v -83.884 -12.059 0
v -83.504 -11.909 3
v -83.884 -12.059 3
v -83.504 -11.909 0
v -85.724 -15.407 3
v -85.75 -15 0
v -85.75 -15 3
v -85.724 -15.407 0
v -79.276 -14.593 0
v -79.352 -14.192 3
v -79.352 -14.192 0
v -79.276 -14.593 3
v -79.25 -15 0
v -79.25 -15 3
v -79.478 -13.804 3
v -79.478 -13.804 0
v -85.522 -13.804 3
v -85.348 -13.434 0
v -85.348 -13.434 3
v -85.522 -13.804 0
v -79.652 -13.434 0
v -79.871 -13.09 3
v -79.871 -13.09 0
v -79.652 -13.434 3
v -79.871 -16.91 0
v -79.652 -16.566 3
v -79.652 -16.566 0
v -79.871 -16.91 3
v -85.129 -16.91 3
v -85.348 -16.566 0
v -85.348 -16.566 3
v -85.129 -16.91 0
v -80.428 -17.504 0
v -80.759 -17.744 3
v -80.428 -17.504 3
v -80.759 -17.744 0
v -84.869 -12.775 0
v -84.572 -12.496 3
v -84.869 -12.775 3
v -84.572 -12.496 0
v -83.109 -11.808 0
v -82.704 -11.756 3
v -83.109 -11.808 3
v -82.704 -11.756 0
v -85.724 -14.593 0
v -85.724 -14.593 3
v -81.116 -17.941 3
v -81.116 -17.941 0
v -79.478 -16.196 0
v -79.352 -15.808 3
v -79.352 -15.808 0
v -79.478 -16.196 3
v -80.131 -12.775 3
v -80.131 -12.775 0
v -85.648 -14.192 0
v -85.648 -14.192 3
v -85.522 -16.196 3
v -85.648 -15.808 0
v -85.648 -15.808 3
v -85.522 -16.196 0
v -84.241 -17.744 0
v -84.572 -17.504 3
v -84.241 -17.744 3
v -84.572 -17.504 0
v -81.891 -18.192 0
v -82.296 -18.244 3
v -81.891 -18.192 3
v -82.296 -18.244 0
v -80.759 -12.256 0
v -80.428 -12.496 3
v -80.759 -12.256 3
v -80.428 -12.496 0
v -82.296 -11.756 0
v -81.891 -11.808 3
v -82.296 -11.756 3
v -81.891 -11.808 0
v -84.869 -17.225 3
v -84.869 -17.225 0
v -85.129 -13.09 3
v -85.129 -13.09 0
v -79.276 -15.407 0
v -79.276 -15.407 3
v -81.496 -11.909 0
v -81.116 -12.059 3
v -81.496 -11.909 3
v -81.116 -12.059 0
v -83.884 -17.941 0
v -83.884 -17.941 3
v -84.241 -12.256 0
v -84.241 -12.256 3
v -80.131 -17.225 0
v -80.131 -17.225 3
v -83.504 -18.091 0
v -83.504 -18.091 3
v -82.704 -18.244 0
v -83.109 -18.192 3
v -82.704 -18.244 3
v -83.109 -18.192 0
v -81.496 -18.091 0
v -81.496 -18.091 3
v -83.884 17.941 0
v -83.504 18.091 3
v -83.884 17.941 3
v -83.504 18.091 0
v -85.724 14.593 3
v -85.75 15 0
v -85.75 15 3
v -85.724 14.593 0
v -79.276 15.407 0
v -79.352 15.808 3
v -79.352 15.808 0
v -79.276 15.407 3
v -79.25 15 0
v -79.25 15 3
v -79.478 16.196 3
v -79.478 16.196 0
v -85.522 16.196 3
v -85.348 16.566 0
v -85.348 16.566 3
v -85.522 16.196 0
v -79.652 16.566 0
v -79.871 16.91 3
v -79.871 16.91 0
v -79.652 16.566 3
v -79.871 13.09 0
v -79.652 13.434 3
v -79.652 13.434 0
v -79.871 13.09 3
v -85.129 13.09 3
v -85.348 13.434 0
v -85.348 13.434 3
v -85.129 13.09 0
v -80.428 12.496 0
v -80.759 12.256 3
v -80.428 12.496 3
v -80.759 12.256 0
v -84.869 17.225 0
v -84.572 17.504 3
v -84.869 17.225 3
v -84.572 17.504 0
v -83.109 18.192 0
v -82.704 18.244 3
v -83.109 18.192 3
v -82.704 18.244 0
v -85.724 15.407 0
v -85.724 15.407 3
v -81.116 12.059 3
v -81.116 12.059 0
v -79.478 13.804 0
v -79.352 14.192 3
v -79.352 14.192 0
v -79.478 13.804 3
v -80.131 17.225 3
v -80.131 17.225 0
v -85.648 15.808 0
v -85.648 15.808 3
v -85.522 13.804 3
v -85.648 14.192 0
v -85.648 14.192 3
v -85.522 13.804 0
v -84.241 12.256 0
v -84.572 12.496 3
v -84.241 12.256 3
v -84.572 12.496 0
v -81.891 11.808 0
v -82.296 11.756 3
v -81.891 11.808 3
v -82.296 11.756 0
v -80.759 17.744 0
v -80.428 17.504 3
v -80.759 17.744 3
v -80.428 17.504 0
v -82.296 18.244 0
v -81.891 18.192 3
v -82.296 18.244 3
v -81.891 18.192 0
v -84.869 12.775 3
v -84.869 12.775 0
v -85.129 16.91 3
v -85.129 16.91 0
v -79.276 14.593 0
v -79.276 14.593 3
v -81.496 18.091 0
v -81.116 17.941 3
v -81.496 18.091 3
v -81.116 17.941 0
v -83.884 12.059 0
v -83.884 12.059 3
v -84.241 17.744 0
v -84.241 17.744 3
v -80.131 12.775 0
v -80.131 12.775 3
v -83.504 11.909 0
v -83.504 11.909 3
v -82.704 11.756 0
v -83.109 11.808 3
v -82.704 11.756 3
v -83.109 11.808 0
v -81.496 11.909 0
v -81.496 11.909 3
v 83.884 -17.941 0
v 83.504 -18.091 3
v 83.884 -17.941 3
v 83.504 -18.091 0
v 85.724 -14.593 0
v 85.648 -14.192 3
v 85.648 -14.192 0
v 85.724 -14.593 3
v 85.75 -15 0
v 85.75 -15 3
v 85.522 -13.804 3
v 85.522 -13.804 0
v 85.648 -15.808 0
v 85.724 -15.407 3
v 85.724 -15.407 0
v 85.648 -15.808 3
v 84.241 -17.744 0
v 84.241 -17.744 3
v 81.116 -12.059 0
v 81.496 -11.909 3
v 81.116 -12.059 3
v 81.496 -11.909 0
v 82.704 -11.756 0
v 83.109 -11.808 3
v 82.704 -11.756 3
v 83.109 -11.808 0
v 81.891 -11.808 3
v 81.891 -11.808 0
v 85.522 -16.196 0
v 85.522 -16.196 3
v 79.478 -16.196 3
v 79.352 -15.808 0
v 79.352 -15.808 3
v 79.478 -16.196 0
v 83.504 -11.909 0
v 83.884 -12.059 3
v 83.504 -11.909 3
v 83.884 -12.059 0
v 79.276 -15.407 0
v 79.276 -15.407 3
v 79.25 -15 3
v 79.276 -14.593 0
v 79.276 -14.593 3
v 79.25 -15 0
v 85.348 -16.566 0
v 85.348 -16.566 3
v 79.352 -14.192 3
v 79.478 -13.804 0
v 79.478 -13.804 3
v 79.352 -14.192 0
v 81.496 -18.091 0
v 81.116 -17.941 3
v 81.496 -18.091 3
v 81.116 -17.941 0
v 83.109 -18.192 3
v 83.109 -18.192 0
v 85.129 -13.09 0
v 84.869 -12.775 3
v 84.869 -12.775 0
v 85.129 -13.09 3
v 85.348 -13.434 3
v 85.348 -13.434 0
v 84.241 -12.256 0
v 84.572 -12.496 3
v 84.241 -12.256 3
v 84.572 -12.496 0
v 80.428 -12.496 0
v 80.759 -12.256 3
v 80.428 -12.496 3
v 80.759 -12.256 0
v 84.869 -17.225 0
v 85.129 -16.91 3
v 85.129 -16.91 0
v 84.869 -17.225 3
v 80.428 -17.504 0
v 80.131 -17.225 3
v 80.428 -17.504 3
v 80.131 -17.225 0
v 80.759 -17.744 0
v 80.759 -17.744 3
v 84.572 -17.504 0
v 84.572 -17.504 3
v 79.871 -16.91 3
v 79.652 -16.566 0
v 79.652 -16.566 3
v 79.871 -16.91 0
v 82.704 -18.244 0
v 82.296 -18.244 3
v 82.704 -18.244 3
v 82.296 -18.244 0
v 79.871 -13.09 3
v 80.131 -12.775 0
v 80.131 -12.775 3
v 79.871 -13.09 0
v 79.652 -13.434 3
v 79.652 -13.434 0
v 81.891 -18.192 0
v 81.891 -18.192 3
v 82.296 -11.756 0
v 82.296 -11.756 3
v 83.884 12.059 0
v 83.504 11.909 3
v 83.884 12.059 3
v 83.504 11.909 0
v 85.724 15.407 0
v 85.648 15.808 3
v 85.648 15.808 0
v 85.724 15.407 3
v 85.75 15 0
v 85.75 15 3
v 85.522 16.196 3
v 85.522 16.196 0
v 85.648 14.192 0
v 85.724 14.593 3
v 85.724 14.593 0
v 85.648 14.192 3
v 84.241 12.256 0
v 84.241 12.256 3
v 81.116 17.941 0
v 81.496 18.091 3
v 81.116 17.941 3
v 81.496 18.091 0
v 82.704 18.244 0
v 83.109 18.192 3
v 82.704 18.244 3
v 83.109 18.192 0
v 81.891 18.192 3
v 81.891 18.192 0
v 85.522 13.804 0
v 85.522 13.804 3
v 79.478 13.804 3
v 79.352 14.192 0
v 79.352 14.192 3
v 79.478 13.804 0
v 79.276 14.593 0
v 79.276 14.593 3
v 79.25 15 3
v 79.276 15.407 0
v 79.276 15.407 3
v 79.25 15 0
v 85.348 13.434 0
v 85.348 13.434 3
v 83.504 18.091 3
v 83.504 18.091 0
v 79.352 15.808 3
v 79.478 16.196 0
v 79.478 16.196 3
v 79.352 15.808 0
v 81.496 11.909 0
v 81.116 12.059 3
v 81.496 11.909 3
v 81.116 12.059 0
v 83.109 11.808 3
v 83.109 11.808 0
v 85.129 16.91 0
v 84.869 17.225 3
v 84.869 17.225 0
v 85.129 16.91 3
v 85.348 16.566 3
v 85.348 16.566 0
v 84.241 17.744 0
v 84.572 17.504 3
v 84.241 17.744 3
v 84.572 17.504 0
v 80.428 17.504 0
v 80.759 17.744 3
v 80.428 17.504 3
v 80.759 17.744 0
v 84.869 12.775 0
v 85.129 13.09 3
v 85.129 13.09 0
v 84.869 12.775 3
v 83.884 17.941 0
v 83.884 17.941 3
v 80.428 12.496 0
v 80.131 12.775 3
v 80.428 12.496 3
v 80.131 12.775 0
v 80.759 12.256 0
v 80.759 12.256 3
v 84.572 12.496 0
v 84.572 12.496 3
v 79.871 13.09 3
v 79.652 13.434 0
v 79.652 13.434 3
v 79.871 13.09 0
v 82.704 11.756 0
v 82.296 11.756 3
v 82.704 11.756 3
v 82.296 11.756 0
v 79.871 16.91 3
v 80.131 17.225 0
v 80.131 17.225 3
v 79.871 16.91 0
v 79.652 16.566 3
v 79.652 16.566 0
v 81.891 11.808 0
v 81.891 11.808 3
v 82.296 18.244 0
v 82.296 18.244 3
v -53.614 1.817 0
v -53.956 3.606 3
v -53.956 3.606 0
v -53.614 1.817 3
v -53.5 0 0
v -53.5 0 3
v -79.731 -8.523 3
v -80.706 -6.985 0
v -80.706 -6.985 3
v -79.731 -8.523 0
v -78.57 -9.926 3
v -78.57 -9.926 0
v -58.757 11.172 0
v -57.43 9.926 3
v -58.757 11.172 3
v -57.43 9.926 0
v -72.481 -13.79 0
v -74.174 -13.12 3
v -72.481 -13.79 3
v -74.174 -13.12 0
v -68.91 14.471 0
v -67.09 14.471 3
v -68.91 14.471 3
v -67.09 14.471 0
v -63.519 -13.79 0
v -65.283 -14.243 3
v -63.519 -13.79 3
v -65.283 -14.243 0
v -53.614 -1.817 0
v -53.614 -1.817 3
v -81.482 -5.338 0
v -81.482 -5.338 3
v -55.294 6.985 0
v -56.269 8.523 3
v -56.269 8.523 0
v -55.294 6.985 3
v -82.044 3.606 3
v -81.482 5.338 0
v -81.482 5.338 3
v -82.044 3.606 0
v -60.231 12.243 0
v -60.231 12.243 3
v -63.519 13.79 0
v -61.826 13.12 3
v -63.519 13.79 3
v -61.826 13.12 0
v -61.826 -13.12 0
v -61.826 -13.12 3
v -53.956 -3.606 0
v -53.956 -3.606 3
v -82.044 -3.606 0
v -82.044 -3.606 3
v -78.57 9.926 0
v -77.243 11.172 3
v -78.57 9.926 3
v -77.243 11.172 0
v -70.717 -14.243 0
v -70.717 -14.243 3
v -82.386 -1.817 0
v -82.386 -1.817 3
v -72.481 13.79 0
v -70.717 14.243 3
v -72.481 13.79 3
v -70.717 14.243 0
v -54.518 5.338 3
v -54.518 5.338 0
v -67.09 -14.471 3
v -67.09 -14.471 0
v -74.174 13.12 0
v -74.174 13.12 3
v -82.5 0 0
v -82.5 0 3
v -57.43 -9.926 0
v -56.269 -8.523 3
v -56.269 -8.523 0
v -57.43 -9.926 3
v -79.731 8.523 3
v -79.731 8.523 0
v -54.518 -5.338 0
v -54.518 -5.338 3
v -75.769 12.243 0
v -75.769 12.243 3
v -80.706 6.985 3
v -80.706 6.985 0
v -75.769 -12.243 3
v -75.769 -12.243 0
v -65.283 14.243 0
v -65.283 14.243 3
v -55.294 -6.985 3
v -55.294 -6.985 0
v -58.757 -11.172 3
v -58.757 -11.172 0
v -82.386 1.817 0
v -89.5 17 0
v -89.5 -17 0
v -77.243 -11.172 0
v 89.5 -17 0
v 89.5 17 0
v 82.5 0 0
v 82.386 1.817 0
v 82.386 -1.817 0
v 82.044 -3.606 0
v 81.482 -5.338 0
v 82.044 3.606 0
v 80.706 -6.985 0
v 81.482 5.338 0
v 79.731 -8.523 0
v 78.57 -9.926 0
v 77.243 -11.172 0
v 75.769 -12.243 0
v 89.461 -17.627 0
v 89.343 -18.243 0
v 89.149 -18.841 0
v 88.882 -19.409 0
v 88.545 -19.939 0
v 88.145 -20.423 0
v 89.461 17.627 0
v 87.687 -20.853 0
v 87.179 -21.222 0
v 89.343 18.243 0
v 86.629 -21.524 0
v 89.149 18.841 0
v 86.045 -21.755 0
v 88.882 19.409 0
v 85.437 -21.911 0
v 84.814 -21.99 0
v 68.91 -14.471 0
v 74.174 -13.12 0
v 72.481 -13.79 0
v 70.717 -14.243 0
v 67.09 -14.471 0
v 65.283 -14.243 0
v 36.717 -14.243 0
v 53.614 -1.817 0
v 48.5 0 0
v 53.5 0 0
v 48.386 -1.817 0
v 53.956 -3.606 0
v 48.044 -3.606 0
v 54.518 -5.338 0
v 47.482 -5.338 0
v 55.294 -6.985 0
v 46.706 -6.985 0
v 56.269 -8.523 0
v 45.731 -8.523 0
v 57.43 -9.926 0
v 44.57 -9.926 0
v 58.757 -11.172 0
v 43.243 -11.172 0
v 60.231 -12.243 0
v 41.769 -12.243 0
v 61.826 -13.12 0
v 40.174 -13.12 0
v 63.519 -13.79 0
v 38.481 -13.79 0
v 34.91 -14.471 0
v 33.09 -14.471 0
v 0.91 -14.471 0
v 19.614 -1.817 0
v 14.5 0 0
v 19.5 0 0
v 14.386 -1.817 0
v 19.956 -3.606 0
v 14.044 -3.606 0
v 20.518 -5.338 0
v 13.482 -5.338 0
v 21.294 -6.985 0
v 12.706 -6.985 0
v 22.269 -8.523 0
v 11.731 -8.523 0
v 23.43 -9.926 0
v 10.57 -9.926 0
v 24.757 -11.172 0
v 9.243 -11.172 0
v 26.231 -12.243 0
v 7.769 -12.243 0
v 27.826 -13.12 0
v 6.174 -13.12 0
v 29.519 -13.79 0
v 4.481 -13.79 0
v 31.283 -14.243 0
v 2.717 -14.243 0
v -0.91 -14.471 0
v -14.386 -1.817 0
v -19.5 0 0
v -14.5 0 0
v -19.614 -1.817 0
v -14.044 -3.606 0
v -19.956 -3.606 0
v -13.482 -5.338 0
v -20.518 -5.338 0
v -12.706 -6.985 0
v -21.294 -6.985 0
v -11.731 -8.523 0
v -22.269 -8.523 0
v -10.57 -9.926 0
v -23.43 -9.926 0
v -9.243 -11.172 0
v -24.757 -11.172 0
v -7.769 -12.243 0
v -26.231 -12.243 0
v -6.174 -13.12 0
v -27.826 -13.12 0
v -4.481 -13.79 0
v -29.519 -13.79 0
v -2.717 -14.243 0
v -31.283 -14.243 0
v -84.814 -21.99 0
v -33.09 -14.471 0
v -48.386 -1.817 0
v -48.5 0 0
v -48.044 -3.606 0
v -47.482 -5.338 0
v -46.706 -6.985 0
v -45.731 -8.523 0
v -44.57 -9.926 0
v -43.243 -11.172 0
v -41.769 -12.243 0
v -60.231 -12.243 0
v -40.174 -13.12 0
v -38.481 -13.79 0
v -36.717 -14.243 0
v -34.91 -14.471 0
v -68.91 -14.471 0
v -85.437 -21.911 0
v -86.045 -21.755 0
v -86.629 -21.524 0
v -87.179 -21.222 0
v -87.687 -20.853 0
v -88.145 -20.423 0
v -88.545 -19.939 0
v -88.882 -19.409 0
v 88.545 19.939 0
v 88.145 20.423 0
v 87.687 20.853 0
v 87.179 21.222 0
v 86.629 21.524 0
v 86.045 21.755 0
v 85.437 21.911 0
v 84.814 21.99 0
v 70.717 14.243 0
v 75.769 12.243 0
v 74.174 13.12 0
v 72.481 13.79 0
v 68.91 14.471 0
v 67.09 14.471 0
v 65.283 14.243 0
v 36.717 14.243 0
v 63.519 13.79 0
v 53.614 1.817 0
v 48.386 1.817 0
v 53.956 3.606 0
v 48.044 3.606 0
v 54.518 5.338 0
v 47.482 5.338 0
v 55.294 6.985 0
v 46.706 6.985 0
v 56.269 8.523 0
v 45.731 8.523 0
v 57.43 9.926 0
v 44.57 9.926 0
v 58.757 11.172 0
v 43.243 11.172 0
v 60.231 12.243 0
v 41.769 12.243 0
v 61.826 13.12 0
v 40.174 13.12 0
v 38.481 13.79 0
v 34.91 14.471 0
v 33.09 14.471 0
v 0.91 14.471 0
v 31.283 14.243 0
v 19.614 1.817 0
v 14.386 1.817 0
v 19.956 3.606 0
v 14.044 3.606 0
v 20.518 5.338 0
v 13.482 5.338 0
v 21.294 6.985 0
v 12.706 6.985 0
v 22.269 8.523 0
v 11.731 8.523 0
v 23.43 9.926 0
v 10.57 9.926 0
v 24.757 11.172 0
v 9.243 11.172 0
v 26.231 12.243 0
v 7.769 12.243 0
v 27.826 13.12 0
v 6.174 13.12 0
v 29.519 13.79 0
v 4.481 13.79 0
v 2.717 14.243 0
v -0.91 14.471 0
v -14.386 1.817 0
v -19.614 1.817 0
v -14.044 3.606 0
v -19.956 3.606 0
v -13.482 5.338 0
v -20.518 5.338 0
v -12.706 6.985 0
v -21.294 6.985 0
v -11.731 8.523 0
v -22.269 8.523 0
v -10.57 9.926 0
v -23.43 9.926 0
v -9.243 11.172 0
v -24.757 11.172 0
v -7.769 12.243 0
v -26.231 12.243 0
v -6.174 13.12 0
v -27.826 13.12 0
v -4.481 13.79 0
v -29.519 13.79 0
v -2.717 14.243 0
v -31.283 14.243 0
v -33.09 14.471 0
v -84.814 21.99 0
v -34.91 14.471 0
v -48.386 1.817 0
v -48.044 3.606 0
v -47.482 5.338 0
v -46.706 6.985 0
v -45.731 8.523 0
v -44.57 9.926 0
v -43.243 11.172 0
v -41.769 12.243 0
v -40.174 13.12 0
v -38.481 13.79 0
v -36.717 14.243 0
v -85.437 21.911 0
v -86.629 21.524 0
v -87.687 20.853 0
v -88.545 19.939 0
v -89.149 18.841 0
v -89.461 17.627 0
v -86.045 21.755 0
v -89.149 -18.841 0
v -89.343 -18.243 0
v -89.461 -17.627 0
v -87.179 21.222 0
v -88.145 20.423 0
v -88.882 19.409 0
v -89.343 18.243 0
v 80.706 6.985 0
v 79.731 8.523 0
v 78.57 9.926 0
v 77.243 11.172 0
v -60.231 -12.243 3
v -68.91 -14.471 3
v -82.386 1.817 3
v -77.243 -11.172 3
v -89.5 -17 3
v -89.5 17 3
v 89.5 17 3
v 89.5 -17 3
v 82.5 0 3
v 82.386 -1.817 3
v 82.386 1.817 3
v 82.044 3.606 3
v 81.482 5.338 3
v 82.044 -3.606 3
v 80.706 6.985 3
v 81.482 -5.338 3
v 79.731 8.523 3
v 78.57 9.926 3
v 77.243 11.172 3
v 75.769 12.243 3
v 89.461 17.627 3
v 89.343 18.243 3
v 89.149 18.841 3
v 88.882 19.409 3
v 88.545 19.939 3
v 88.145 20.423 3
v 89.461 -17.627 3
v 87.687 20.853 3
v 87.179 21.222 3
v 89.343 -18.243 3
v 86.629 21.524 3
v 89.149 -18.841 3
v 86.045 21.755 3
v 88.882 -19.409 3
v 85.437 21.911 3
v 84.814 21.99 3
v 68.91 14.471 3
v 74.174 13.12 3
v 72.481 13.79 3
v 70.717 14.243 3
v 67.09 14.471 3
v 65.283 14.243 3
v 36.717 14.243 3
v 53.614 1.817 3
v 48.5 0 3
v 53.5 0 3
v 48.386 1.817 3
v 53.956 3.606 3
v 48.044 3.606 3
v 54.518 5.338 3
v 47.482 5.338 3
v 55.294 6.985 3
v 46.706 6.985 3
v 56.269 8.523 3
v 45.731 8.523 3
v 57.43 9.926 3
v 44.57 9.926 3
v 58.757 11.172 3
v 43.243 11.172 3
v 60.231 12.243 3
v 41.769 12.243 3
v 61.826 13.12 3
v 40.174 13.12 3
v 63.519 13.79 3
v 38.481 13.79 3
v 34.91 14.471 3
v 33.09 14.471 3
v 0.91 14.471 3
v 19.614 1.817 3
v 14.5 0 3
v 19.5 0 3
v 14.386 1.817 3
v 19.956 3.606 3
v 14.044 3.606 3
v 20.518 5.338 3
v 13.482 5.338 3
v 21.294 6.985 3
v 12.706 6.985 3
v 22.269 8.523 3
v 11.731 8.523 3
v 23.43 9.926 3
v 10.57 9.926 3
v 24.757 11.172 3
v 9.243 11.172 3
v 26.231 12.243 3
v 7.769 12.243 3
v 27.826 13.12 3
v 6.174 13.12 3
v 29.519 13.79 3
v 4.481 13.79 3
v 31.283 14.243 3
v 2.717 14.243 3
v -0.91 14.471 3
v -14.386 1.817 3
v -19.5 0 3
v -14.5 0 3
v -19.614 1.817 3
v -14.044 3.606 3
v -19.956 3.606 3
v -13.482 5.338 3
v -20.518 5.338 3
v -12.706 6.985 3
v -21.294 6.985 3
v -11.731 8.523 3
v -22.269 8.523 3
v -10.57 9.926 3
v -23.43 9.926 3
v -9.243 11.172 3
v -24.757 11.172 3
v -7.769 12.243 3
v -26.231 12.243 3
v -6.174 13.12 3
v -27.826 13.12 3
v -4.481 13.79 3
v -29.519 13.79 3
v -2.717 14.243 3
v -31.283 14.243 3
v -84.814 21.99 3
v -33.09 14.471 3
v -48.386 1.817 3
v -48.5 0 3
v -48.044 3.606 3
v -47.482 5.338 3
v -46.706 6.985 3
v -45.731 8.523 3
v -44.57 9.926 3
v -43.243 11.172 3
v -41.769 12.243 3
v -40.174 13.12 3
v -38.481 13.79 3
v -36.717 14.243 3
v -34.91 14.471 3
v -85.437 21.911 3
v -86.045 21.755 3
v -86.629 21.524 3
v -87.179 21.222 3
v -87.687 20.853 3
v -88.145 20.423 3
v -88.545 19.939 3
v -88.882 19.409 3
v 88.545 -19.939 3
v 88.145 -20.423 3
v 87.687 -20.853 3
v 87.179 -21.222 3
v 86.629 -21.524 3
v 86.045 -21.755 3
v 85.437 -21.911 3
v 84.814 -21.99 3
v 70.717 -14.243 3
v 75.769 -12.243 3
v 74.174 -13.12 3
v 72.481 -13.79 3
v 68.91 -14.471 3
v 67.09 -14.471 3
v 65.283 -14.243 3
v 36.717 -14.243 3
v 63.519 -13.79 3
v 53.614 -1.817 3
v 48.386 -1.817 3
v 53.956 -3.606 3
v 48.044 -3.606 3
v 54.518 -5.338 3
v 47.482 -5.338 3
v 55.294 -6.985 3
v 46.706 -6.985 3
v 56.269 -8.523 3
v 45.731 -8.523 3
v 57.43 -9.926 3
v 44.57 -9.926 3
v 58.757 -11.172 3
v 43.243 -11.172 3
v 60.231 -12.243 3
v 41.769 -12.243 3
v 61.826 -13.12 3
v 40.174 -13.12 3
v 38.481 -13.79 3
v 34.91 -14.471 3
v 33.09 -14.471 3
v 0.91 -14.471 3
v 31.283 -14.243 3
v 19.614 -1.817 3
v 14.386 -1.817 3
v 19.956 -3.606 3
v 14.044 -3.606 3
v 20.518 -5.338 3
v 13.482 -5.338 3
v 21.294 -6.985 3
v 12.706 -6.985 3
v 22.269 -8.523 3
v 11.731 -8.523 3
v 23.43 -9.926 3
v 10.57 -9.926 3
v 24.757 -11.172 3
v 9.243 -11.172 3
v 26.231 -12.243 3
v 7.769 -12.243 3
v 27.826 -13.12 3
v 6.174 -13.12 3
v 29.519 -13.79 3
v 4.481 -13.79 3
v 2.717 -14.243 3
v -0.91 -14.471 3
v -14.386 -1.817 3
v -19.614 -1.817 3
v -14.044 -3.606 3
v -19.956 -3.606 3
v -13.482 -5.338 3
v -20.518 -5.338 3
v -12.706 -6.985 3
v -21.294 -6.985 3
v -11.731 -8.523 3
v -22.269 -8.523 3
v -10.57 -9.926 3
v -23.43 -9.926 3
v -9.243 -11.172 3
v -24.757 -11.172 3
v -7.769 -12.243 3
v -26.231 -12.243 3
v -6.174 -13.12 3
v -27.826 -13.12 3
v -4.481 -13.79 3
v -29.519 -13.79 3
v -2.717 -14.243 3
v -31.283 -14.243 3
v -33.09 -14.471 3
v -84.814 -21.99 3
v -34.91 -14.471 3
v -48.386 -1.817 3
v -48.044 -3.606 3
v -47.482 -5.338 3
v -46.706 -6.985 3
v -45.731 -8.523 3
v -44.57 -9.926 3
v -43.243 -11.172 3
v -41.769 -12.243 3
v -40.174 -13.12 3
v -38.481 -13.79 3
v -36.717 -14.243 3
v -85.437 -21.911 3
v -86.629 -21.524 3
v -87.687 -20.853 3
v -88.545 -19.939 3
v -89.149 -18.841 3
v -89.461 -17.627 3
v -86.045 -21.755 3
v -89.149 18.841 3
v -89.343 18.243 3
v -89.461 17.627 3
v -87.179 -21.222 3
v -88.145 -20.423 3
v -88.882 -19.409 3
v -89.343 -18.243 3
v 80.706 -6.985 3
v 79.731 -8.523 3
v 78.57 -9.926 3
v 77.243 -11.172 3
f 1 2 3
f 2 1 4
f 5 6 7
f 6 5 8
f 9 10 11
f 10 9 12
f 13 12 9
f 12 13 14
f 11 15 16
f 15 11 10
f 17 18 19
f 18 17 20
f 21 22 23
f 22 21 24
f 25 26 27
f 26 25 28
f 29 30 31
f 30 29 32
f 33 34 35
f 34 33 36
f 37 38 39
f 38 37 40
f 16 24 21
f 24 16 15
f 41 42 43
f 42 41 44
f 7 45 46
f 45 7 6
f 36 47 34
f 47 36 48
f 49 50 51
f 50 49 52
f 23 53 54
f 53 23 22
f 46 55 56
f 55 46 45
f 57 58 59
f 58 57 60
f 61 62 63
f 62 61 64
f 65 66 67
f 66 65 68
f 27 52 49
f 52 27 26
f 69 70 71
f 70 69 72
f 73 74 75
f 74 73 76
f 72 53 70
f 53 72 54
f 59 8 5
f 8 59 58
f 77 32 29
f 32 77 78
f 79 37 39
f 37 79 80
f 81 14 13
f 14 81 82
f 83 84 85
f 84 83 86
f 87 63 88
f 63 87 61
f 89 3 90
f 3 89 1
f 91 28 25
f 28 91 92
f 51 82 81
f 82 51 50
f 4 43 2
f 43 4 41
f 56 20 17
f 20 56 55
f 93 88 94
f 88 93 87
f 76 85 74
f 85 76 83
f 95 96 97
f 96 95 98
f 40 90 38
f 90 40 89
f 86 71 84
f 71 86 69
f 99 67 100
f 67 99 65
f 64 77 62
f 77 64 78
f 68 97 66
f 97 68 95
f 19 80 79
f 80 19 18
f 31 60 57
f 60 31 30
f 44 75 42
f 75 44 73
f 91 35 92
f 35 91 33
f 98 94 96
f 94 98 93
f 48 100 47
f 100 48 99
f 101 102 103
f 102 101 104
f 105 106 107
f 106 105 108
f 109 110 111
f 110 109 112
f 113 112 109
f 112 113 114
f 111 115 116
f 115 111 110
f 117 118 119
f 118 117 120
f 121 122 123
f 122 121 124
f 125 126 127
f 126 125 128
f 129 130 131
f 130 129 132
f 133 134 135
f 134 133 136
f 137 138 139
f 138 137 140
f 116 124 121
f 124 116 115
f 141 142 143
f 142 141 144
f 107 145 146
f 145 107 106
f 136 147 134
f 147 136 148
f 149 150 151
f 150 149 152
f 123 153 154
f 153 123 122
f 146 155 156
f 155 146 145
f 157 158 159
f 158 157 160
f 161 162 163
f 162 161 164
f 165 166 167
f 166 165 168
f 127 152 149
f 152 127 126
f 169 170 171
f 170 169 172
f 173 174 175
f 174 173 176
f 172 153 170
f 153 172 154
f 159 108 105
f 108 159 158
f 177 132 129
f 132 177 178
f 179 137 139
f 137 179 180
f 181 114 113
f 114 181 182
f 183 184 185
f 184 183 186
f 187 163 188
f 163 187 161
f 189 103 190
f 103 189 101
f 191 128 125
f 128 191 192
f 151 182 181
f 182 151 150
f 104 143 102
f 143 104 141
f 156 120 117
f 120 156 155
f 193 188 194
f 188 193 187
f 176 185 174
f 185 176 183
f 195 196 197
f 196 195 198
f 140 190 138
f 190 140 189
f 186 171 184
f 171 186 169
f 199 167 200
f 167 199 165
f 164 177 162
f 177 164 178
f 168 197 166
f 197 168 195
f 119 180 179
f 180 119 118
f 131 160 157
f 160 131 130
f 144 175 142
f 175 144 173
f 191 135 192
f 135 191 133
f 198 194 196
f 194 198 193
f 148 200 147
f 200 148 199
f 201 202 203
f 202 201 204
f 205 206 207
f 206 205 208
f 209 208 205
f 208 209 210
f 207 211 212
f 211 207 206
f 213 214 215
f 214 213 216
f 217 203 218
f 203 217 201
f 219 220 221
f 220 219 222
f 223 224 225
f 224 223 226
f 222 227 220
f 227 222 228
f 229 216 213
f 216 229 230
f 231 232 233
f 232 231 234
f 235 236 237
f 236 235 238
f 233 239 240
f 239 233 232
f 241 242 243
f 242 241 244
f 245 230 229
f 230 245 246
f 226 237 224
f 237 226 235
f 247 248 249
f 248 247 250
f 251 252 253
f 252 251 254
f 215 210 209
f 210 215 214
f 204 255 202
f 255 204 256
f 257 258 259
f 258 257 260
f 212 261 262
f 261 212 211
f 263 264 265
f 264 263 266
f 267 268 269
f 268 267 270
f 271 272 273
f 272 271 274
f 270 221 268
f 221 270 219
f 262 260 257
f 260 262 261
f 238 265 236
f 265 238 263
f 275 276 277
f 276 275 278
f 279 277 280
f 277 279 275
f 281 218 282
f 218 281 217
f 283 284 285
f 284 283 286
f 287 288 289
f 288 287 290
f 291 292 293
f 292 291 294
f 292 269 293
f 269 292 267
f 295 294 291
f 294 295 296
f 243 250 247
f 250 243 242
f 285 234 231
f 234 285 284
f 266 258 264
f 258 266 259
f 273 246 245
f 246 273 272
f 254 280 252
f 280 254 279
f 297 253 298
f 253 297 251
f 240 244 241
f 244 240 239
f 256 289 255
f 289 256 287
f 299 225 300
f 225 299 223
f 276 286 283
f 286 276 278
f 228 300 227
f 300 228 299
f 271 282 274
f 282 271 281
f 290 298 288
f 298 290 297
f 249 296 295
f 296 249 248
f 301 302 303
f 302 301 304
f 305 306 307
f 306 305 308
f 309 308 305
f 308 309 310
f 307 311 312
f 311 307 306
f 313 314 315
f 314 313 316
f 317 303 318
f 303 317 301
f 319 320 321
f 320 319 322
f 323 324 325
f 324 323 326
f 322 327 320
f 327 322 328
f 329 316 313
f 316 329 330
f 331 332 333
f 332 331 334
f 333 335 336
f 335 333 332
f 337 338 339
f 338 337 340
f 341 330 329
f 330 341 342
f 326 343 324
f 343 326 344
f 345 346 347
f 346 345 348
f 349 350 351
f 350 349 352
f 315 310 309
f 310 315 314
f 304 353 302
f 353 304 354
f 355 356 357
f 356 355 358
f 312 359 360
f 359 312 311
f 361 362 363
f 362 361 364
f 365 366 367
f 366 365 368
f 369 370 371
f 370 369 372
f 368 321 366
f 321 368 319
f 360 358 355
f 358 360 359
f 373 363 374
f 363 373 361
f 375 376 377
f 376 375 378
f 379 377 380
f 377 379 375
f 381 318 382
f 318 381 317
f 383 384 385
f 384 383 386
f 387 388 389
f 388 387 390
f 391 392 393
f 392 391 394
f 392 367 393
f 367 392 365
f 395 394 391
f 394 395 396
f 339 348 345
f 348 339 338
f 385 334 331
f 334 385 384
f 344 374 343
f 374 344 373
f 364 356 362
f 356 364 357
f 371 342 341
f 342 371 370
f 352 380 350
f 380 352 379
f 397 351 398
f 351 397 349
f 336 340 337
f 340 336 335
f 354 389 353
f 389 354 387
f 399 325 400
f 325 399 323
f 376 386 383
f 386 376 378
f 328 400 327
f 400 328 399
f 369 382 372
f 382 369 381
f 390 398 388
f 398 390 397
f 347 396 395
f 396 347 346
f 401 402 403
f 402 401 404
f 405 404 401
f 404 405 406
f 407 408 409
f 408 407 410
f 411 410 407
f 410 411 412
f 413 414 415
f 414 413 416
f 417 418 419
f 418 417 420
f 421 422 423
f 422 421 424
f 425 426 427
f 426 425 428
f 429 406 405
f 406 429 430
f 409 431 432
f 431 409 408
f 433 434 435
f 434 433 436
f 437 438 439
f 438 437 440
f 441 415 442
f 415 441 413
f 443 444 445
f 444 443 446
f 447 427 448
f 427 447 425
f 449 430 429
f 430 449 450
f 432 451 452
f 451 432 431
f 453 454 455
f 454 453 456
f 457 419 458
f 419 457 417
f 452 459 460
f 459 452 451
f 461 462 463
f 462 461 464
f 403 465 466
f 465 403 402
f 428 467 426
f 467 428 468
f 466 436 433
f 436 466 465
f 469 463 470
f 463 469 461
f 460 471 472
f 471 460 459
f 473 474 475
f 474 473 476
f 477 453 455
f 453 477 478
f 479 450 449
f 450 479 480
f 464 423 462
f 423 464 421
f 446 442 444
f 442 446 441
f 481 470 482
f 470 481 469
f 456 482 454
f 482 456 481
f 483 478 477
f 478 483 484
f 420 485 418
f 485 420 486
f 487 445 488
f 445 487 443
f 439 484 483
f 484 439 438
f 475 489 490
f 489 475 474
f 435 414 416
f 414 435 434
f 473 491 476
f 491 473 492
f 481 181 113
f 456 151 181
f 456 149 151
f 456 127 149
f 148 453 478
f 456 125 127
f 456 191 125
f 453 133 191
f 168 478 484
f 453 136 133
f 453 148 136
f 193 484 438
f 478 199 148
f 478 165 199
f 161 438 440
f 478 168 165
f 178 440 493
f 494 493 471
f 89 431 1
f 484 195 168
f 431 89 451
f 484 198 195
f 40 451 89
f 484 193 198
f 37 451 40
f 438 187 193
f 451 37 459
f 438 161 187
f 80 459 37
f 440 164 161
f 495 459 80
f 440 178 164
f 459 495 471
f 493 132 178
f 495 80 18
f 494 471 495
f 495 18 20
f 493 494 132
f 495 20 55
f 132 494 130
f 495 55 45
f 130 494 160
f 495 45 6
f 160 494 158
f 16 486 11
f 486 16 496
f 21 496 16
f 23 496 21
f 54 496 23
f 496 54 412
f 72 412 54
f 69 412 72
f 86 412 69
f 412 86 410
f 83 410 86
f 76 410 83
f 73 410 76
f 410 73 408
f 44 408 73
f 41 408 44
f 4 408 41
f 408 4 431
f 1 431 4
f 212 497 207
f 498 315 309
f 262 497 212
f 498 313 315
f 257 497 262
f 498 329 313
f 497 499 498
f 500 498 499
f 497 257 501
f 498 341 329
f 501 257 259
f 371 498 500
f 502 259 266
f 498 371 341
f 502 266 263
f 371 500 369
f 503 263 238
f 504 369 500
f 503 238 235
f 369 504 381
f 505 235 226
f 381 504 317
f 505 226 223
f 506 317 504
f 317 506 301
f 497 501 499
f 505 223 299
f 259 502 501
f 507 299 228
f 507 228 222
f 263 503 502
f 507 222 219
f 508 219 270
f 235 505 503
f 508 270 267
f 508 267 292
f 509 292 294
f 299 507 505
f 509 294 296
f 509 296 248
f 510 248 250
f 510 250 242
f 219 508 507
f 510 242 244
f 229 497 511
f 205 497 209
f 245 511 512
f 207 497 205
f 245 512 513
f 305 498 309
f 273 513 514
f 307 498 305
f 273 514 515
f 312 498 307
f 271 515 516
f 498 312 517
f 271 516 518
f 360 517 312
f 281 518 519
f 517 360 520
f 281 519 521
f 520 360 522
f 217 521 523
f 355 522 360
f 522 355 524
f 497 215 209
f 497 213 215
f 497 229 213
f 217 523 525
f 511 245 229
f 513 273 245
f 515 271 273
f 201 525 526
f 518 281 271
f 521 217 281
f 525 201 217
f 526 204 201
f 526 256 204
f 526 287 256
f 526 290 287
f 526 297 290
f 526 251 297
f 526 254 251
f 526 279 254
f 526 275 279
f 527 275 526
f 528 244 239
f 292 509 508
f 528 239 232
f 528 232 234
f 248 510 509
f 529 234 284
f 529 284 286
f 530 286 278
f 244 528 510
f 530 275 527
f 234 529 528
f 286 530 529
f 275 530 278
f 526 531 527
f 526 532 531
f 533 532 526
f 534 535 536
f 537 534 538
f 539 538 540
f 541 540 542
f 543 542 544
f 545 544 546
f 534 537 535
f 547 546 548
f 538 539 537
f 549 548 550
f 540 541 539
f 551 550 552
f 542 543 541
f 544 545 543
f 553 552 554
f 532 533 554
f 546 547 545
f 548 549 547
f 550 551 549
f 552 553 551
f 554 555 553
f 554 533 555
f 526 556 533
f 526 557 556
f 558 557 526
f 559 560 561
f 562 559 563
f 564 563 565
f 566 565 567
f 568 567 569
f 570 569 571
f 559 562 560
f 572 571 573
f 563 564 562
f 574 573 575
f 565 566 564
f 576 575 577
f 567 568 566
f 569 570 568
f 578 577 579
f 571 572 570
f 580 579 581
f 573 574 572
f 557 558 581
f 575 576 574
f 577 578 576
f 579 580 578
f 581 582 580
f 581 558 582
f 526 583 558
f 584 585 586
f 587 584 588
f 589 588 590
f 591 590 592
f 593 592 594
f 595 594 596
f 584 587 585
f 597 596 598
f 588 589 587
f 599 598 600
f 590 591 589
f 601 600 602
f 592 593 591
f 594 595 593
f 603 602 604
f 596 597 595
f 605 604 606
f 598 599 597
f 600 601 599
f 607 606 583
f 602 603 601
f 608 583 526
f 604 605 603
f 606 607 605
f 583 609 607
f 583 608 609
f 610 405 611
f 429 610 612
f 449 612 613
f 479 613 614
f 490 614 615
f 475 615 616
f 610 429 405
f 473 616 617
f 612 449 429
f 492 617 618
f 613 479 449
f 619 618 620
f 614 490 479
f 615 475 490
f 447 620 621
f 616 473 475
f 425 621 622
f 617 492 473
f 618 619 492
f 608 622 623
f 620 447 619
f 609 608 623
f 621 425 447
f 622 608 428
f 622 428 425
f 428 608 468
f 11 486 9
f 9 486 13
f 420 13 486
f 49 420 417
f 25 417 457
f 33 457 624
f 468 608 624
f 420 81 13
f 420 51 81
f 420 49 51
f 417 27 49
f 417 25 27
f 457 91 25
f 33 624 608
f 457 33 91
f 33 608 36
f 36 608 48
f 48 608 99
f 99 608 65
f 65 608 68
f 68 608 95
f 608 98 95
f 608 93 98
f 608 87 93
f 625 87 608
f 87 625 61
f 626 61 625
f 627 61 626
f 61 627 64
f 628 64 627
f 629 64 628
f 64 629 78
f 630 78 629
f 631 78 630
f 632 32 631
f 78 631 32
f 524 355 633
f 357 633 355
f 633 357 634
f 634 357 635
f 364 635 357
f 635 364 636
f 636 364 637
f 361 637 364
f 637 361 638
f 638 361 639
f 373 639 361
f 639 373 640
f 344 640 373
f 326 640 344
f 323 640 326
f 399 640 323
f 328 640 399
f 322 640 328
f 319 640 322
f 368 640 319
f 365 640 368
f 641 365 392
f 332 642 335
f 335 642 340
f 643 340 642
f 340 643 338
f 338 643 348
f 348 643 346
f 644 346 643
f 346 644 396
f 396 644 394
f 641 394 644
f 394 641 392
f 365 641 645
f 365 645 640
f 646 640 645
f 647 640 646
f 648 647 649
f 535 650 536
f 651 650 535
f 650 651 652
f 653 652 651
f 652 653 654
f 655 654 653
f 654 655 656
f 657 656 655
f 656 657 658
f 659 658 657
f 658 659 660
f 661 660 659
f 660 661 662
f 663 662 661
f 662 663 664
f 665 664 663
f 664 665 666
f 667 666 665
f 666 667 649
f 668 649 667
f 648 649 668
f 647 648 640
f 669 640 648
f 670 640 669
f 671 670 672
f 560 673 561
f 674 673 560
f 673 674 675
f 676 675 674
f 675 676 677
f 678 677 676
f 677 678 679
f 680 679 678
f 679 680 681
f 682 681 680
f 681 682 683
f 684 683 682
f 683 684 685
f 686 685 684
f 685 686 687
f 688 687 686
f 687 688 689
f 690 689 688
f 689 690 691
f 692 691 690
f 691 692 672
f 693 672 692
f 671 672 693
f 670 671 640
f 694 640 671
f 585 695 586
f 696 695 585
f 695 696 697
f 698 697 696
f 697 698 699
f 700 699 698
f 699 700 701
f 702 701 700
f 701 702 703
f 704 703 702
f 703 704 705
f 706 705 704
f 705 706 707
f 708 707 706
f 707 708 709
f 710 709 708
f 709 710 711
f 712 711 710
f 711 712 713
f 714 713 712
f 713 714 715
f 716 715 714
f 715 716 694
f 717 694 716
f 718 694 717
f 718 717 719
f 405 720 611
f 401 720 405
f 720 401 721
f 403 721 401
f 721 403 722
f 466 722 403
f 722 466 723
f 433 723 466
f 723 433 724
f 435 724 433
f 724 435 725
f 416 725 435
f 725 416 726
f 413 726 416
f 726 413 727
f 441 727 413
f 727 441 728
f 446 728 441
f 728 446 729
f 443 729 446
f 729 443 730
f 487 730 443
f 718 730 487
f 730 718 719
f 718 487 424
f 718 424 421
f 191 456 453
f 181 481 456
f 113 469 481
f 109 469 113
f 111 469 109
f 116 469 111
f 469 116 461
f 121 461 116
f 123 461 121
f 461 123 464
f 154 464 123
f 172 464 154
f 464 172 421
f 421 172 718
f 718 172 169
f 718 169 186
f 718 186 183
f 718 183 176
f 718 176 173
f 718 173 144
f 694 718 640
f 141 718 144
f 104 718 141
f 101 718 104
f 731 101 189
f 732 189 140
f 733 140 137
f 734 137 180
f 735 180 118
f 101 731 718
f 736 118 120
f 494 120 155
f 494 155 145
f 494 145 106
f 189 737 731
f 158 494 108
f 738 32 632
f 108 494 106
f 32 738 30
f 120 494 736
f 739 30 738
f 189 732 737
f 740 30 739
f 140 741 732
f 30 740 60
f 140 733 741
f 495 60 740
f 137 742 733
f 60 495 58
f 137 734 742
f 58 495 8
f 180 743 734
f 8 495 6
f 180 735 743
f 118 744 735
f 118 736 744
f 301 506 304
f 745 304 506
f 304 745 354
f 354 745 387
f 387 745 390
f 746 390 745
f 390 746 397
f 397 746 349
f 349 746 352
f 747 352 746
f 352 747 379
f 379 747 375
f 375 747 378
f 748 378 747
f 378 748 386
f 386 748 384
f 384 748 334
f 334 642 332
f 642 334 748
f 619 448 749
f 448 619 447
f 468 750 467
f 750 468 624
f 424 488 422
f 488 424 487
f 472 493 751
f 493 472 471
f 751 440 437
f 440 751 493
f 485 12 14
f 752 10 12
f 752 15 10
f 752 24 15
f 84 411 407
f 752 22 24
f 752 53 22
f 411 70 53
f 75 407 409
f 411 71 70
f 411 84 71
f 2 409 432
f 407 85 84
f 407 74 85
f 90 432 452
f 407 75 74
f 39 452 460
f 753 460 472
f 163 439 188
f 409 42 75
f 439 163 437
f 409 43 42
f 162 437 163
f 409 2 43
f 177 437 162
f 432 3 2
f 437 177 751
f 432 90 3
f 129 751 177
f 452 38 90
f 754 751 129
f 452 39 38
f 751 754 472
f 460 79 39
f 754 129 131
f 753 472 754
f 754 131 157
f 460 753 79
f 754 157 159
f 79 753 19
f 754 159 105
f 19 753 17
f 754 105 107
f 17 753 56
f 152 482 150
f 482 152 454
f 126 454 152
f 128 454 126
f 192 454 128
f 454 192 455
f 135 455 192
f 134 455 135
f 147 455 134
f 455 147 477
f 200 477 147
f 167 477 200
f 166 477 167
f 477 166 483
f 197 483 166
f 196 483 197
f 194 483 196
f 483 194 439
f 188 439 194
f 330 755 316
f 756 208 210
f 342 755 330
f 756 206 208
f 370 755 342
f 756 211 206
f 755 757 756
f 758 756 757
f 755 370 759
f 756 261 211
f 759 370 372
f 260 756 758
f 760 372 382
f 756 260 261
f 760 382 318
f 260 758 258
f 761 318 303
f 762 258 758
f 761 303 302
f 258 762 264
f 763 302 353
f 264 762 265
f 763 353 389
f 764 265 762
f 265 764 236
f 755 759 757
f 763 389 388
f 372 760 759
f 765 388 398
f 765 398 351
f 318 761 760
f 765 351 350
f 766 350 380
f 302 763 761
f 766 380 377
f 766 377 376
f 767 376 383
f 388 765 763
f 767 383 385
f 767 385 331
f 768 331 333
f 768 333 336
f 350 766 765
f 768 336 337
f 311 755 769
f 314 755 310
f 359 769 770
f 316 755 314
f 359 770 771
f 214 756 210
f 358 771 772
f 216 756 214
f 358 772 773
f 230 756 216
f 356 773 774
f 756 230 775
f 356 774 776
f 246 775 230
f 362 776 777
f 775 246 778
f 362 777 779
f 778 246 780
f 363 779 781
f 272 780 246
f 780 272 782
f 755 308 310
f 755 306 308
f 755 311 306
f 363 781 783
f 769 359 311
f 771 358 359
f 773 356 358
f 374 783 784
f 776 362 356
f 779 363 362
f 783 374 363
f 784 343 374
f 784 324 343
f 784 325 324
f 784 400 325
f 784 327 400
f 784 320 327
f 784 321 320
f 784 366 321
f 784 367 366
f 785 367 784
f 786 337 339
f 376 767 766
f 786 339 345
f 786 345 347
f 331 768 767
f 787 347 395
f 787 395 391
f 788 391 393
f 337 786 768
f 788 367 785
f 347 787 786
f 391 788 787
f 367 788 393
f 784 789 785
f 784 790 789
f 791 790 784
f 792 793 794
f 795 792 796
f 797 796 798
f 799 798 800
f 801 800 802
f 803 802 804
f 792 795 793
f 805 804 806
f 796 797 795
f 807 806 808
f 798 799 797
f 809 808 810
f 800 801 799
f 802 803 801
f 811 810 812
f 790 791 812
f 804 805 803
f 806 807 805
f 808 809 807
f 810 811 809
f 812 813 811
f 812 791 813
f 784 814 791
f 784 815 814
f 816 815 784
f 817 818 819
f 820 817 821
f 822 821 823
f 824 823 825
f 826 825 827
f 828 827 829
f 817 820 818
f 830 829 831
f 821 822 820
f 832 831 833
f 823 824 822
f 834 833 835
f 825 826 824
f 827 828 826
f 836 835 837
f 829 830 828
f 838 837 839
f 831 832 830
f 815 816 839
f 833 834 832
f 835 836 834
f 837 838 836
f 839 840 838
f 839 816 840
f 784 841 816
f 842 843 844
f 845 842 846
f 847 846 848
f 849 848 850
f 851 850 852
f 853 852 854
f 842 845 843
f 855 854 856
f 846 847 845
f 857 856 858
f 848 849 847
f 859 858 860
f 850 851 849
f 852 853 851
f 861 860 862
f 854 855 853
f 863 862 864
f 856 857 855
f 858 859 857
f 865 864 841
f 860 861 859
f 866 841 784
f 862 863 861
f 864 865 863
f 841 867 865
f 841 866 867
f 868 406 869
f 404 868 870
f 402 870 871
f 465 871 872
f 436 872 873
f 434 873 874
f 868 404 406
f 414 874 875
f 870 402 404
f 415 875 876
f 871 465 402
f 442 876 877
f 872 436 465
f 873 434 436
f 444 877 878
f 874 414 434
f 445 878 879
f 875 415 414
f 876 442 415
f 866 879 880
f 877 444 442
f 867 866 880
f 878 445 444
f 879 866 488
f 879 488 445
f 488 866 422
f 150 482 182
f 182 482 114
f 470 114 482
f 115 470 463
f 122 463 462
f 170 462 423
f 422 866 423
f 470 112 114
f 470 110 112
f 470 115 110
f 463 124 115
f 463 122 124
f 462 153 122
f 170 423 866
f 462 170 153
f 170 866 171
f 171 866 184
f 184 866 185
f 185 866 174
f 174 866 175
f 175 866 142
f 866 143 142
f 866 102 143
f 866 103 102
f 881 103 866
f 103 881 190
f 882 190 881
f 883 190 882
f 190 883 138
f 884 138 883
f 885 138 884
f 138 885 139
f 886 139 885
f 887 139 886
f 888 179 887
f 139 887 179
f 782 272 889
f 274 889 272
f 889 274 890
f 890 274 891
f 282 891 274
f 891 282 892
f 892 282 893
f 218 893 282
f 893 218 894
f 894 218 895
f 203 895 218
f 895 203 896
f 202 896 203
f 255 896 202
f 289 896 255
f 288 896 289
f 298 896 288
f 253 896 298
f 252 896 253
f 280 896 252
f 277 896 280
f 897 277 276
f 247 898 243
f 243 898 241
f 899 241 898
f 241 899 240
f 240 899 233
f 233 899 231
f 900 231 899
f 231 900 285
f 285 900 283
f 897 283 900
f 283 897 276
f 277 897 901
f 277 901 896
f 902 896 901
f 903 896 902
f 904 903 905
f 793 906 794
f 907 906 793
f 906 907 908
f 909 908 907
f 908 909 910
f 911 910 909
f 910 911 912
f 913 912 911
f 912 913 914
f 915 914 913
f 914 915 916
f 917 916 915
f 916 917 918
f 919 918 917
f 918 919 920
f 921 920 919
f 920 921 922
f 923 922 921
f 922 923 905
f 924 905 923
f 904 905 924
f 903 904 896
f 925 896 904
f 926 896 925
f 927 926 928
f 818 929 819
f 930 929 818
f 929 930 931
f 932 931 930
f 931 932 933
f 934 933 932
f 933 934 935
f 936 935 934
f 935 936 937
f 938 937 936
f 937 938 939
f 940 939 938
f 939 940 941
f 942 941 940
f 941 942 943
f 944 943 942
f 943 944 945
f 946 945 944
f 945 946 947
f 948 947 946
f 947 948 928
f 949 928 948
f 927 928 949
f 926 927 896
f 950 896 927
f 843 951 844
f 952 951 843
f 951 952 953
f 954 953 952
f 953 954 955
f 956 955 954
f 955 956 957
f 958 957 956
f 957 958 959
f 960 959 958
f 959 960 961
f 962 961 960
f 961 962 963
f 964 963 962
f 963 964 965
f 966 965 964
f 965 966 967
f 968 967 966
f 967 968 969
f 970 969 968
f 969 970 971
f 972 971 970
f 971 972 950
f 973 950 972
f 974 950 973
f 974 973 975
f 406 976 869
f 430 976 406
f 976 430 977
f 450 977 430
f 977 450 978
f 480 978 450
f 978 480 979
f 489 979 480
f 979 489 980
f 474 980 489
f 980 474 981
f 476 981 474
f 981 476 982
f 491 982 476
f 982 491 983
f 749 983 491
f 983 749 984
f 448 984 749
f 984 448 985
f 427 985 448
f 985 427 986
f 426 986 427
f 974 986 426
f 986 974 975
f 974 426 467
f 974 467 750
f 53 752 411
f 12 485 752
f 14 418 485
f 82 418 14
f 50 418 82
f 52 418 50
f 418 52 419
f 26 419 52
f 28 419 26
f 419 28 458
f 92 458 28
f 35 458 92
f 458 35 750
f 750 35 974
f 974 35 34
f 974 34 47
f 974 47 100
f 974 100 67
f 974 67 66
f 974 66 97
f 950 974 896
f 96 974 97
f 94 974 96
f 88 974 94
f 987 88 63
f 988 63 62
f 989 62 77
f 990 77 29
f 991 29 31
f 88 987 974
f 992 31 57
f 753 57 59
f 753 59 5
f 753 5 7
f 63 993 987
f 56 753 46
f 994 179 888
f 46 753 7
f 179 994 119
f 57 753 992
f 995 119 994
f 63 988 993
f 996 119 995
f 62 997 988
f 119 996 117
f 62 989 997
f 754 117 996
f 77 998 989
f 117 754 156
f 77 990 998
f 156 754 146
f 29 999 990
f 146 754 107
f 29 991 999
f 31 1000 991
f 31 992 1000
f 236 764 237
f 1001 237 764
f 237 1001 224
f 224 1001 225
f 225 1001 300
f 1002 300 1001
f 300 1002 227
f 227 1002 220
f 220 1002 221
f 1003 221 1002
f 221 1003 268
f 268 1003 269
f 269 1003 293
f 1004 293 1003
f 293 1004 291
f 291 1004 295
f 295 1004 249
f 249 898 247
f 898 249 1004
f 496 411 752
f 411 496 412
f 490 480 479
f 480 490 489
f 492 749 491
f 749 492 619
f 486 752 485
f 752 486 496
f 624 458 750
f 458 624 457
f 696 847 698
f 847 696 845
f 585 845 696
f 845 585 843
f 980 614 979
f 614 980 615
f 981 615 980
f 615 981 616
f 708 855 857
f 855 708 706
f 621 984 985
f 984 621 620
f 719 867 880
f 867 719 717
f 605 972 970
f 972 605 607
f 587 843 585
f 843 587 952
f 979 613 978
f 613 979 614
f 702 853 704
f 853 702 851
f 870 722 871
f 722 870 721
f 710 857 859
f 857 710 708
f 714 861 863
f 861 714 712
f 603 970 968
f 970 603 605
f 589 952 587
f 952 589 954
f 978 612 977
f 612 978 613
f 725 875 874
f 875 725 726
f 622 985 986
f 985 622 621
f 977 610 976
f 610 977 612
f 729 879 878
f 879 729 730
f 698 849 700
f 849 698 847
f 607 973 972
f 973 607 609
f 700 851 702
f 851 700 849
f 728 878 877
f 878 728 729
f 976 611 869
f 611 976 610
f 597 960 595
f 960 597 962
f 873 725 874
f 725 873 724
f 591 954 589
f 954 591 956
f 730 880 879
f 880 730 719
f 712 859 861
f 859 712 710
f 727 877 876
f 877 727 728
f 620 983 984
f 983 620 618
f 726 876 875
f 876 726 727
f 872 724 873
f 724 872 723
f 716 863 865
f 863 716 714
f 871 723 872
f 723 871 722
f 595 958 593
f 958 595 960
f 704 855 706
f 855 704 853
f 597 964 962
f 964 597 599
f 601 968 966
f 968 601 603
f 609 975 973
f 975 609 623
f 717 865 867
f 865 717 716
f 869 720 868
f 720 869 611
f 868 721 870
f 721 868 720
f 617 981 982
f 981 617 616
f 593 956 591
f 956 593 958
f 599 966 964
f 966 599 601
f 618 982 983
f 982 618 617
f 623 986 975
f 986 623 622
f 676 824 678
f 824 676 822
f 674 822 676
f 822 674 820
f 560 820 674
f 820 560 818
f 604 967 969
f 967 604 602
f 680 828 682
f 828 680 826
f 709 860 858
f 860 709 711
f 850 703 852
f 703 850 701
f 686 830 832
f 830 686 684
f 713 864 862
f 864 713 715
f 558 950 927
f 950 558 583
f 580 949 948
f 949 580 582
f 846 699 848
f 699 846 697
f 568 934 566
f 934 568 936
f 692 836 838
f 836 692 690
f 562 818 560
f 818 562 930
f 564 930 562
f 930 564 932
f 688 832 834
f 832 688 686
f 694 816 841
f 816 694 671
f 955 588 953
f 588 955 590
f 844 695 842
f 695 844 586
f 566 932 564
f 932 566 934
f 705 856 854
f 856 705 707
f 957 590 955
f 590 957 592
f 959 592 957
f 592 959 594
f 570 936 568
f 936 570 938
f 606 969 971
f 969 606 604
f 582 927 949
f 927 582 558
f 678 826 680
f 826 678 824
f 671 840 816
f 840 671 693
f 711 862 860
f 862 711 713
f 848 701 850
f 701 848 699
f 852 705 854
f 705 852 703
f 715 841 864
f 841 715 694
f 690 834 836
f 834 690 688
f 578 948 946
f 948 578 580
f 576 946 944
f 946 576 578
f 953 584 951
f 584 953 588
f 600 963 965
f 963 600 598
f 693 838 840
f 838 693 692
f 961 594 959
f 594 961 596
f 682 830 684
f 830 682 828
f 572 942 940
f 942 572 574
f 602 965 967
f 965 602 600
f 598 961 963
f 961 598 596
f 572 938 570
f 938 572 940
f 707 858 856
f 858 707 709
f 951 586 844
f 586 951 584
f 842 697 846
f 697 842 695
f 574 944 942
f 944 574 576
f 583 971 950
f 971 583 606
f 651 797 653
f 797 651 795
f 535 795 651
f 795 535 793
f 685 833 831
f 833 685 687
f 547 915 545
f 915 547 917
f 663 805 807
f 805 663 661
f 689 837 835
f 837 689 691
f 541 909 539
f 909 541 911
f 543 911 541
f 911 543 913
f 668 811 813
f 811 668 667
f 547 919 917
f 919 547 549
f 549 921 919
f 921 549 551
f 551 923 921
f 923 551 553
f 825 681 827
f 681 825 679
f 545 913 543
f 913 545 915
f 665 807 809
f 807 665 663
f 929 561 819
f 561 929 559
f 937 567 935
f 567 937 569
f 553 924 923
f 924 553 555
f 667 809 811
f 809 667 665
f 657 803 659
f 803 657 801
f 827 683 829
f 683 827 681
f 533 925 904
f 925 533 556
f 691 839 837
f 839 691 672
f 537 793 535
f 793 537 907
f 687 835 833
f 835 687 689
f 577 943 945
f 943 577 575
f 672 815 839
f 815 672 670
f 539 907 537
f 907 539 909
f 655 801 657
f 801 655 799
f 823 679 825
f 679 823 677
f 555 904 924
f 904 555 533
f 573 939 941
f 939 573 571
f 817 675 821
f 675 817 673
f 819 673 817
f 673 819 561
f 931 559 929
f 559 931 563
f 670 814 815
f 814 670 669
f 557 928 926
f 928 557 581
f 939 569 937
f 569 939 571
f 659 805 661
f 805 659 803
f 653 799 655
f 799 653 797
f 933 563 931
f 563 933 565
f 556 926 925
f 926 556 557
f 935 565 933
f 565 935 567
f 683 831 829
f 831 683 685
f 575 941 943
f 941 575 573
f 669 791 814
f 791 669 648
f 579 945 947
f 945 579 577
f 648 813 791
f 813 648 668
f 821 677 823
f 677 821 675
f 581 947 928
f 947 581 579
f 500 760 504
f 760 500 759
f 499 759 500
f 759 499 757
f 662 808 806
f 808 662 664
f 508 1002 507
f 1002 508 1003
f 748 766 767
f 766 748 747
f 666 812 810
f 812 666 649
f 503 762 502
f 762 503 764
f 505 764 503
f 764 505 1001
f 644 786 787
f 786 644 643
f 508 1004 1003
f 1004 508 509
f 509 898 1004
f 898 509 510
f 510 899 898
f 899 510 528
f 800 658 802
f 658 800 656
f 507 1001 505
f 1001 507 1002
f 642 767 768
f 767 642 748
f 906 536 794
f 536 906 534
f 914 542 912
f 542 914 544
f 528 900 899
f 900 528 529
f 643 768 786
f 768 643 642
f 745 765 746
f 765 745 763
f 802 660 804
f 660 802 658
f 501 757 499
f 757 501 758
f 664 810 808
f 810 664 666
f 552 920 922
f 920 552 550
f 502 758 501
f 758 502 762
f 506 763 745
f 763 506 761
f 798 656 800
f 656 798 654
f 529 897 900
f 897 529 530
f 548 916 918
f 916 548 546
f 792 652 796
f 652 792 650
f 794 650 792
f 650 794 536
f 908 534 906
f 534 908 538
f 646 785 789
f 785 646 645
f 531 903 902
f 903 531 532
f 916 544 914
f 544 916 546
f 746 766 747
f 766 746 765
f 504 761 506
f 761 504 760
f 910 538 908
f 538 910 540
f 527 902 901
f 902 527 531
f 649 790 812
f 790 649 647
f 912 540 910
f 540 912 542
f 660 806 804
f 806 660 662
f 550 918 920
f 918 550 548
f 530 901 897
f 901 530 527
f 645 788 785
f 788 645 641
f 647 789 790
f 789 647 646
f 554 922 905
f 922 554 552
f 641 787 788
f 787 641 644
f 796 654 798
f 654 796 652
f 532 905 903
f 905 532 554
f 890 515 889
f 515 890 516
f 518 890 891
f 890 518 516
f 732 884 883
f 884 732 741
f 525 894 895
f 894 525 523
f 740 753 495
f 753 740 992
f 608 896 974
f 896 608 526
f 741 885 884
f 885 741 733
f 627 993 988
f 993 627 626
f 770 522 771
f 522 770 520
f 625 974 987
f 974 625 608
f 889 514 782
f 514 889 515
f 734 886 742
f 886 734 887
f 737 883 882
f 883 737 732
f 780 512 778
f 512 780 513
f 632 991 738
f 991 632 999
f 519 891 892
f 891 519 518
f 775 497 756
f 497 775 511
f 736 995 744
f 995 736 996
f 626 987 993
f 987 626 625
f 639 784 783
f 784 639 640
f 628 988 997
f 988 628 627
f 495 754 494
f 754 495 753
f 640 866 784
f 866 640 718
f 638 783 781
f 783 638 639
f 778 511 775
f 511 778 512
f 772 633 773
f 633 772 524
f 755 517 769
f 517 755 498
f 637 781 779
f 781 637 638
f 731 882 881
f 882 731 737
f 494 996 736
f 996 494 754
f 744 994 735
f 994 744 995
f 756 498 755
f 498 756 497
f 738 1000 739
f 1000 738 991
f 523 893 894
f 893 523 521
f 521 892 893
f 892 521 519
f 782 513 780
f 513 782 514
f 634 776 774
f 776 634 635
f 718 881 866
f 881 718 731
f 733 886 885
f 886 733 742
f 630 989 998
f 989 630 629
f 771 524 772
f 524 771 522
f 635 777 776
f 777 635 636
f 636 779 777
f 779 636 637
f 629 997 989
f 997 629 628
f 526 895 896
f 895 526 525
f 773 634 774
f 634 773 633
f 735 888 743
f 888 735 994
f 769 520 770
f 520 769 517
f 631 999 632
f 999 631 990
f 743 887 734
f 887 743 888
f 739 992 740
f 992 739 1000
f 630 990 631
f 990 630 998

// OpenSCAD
$fn = 50;

difference() {
	union() {
		hull() {
			translate(v = [-84.5, 17.0, 0]) {
				cylinder(h = 3, r = 5);
			}
			translate(v = [84.5, 17.0, 0]) {
				cylinder(h = 3, r = 5);
			}
			translate(v = [-84.5, -17.0, 0]) {
				cylinder(h = 3, r = 5);
			}
			translate(v = [84.5, -17.0, 0]) {
				cylinder(h = 3, r = 5);
			}
		}
	}
	union() {
		translate(v = [-82.5, -15.0, -100.0]) {
			cylinder(h = 200, r = 3.25);
		}
		translate(v = [-82.5, 15.0, -100.0]) {
			cylinder(h = 200, r = 3.25);
		}
		translate(v = [82.5, -15.0, -100.0]) {
			cylinder(h = 200, r = 3.25);
		}
		translate(v = [82.5, 15.0, -100.0]) {
			cylinder(h = 200, r = 3.25);
		}
		translate(v = [-82.5, -15.0, -100.0]) {
			cylinder(h = 200, r = 1.8);
		}
		translate(v = [-82.5, 15.0, -100.0]) {
			cylinder(h = 200, r = 1.8);
		}
		translate(v = [82.5, -15.0, -100.0]) {
			cylinder(h = 200, r = 1.8);
		}
		translate(v = [82.5, 15.0, -100.0]) {
			cylinder(h = 200, r = 1.8);
		}
		translate(v = [-68.0, 0, 0.0]) {
			cylinder(h = 3, r = 14.5);
		}
		translate(v = [-34.0, 0, 0.0]) {
			cylinder(h = 3, r = 14.5);
		}
		cylinder(h = 3, r = 14.5);
		translate(v = [34.0, 0, 0.0]) {
			cylinder(h = 3, r = 14.5);
		}
		translate(v = [68.0, 0, 0.0]) {
			cylinder(h = 3, r = 14.5);
		}
	}
}
